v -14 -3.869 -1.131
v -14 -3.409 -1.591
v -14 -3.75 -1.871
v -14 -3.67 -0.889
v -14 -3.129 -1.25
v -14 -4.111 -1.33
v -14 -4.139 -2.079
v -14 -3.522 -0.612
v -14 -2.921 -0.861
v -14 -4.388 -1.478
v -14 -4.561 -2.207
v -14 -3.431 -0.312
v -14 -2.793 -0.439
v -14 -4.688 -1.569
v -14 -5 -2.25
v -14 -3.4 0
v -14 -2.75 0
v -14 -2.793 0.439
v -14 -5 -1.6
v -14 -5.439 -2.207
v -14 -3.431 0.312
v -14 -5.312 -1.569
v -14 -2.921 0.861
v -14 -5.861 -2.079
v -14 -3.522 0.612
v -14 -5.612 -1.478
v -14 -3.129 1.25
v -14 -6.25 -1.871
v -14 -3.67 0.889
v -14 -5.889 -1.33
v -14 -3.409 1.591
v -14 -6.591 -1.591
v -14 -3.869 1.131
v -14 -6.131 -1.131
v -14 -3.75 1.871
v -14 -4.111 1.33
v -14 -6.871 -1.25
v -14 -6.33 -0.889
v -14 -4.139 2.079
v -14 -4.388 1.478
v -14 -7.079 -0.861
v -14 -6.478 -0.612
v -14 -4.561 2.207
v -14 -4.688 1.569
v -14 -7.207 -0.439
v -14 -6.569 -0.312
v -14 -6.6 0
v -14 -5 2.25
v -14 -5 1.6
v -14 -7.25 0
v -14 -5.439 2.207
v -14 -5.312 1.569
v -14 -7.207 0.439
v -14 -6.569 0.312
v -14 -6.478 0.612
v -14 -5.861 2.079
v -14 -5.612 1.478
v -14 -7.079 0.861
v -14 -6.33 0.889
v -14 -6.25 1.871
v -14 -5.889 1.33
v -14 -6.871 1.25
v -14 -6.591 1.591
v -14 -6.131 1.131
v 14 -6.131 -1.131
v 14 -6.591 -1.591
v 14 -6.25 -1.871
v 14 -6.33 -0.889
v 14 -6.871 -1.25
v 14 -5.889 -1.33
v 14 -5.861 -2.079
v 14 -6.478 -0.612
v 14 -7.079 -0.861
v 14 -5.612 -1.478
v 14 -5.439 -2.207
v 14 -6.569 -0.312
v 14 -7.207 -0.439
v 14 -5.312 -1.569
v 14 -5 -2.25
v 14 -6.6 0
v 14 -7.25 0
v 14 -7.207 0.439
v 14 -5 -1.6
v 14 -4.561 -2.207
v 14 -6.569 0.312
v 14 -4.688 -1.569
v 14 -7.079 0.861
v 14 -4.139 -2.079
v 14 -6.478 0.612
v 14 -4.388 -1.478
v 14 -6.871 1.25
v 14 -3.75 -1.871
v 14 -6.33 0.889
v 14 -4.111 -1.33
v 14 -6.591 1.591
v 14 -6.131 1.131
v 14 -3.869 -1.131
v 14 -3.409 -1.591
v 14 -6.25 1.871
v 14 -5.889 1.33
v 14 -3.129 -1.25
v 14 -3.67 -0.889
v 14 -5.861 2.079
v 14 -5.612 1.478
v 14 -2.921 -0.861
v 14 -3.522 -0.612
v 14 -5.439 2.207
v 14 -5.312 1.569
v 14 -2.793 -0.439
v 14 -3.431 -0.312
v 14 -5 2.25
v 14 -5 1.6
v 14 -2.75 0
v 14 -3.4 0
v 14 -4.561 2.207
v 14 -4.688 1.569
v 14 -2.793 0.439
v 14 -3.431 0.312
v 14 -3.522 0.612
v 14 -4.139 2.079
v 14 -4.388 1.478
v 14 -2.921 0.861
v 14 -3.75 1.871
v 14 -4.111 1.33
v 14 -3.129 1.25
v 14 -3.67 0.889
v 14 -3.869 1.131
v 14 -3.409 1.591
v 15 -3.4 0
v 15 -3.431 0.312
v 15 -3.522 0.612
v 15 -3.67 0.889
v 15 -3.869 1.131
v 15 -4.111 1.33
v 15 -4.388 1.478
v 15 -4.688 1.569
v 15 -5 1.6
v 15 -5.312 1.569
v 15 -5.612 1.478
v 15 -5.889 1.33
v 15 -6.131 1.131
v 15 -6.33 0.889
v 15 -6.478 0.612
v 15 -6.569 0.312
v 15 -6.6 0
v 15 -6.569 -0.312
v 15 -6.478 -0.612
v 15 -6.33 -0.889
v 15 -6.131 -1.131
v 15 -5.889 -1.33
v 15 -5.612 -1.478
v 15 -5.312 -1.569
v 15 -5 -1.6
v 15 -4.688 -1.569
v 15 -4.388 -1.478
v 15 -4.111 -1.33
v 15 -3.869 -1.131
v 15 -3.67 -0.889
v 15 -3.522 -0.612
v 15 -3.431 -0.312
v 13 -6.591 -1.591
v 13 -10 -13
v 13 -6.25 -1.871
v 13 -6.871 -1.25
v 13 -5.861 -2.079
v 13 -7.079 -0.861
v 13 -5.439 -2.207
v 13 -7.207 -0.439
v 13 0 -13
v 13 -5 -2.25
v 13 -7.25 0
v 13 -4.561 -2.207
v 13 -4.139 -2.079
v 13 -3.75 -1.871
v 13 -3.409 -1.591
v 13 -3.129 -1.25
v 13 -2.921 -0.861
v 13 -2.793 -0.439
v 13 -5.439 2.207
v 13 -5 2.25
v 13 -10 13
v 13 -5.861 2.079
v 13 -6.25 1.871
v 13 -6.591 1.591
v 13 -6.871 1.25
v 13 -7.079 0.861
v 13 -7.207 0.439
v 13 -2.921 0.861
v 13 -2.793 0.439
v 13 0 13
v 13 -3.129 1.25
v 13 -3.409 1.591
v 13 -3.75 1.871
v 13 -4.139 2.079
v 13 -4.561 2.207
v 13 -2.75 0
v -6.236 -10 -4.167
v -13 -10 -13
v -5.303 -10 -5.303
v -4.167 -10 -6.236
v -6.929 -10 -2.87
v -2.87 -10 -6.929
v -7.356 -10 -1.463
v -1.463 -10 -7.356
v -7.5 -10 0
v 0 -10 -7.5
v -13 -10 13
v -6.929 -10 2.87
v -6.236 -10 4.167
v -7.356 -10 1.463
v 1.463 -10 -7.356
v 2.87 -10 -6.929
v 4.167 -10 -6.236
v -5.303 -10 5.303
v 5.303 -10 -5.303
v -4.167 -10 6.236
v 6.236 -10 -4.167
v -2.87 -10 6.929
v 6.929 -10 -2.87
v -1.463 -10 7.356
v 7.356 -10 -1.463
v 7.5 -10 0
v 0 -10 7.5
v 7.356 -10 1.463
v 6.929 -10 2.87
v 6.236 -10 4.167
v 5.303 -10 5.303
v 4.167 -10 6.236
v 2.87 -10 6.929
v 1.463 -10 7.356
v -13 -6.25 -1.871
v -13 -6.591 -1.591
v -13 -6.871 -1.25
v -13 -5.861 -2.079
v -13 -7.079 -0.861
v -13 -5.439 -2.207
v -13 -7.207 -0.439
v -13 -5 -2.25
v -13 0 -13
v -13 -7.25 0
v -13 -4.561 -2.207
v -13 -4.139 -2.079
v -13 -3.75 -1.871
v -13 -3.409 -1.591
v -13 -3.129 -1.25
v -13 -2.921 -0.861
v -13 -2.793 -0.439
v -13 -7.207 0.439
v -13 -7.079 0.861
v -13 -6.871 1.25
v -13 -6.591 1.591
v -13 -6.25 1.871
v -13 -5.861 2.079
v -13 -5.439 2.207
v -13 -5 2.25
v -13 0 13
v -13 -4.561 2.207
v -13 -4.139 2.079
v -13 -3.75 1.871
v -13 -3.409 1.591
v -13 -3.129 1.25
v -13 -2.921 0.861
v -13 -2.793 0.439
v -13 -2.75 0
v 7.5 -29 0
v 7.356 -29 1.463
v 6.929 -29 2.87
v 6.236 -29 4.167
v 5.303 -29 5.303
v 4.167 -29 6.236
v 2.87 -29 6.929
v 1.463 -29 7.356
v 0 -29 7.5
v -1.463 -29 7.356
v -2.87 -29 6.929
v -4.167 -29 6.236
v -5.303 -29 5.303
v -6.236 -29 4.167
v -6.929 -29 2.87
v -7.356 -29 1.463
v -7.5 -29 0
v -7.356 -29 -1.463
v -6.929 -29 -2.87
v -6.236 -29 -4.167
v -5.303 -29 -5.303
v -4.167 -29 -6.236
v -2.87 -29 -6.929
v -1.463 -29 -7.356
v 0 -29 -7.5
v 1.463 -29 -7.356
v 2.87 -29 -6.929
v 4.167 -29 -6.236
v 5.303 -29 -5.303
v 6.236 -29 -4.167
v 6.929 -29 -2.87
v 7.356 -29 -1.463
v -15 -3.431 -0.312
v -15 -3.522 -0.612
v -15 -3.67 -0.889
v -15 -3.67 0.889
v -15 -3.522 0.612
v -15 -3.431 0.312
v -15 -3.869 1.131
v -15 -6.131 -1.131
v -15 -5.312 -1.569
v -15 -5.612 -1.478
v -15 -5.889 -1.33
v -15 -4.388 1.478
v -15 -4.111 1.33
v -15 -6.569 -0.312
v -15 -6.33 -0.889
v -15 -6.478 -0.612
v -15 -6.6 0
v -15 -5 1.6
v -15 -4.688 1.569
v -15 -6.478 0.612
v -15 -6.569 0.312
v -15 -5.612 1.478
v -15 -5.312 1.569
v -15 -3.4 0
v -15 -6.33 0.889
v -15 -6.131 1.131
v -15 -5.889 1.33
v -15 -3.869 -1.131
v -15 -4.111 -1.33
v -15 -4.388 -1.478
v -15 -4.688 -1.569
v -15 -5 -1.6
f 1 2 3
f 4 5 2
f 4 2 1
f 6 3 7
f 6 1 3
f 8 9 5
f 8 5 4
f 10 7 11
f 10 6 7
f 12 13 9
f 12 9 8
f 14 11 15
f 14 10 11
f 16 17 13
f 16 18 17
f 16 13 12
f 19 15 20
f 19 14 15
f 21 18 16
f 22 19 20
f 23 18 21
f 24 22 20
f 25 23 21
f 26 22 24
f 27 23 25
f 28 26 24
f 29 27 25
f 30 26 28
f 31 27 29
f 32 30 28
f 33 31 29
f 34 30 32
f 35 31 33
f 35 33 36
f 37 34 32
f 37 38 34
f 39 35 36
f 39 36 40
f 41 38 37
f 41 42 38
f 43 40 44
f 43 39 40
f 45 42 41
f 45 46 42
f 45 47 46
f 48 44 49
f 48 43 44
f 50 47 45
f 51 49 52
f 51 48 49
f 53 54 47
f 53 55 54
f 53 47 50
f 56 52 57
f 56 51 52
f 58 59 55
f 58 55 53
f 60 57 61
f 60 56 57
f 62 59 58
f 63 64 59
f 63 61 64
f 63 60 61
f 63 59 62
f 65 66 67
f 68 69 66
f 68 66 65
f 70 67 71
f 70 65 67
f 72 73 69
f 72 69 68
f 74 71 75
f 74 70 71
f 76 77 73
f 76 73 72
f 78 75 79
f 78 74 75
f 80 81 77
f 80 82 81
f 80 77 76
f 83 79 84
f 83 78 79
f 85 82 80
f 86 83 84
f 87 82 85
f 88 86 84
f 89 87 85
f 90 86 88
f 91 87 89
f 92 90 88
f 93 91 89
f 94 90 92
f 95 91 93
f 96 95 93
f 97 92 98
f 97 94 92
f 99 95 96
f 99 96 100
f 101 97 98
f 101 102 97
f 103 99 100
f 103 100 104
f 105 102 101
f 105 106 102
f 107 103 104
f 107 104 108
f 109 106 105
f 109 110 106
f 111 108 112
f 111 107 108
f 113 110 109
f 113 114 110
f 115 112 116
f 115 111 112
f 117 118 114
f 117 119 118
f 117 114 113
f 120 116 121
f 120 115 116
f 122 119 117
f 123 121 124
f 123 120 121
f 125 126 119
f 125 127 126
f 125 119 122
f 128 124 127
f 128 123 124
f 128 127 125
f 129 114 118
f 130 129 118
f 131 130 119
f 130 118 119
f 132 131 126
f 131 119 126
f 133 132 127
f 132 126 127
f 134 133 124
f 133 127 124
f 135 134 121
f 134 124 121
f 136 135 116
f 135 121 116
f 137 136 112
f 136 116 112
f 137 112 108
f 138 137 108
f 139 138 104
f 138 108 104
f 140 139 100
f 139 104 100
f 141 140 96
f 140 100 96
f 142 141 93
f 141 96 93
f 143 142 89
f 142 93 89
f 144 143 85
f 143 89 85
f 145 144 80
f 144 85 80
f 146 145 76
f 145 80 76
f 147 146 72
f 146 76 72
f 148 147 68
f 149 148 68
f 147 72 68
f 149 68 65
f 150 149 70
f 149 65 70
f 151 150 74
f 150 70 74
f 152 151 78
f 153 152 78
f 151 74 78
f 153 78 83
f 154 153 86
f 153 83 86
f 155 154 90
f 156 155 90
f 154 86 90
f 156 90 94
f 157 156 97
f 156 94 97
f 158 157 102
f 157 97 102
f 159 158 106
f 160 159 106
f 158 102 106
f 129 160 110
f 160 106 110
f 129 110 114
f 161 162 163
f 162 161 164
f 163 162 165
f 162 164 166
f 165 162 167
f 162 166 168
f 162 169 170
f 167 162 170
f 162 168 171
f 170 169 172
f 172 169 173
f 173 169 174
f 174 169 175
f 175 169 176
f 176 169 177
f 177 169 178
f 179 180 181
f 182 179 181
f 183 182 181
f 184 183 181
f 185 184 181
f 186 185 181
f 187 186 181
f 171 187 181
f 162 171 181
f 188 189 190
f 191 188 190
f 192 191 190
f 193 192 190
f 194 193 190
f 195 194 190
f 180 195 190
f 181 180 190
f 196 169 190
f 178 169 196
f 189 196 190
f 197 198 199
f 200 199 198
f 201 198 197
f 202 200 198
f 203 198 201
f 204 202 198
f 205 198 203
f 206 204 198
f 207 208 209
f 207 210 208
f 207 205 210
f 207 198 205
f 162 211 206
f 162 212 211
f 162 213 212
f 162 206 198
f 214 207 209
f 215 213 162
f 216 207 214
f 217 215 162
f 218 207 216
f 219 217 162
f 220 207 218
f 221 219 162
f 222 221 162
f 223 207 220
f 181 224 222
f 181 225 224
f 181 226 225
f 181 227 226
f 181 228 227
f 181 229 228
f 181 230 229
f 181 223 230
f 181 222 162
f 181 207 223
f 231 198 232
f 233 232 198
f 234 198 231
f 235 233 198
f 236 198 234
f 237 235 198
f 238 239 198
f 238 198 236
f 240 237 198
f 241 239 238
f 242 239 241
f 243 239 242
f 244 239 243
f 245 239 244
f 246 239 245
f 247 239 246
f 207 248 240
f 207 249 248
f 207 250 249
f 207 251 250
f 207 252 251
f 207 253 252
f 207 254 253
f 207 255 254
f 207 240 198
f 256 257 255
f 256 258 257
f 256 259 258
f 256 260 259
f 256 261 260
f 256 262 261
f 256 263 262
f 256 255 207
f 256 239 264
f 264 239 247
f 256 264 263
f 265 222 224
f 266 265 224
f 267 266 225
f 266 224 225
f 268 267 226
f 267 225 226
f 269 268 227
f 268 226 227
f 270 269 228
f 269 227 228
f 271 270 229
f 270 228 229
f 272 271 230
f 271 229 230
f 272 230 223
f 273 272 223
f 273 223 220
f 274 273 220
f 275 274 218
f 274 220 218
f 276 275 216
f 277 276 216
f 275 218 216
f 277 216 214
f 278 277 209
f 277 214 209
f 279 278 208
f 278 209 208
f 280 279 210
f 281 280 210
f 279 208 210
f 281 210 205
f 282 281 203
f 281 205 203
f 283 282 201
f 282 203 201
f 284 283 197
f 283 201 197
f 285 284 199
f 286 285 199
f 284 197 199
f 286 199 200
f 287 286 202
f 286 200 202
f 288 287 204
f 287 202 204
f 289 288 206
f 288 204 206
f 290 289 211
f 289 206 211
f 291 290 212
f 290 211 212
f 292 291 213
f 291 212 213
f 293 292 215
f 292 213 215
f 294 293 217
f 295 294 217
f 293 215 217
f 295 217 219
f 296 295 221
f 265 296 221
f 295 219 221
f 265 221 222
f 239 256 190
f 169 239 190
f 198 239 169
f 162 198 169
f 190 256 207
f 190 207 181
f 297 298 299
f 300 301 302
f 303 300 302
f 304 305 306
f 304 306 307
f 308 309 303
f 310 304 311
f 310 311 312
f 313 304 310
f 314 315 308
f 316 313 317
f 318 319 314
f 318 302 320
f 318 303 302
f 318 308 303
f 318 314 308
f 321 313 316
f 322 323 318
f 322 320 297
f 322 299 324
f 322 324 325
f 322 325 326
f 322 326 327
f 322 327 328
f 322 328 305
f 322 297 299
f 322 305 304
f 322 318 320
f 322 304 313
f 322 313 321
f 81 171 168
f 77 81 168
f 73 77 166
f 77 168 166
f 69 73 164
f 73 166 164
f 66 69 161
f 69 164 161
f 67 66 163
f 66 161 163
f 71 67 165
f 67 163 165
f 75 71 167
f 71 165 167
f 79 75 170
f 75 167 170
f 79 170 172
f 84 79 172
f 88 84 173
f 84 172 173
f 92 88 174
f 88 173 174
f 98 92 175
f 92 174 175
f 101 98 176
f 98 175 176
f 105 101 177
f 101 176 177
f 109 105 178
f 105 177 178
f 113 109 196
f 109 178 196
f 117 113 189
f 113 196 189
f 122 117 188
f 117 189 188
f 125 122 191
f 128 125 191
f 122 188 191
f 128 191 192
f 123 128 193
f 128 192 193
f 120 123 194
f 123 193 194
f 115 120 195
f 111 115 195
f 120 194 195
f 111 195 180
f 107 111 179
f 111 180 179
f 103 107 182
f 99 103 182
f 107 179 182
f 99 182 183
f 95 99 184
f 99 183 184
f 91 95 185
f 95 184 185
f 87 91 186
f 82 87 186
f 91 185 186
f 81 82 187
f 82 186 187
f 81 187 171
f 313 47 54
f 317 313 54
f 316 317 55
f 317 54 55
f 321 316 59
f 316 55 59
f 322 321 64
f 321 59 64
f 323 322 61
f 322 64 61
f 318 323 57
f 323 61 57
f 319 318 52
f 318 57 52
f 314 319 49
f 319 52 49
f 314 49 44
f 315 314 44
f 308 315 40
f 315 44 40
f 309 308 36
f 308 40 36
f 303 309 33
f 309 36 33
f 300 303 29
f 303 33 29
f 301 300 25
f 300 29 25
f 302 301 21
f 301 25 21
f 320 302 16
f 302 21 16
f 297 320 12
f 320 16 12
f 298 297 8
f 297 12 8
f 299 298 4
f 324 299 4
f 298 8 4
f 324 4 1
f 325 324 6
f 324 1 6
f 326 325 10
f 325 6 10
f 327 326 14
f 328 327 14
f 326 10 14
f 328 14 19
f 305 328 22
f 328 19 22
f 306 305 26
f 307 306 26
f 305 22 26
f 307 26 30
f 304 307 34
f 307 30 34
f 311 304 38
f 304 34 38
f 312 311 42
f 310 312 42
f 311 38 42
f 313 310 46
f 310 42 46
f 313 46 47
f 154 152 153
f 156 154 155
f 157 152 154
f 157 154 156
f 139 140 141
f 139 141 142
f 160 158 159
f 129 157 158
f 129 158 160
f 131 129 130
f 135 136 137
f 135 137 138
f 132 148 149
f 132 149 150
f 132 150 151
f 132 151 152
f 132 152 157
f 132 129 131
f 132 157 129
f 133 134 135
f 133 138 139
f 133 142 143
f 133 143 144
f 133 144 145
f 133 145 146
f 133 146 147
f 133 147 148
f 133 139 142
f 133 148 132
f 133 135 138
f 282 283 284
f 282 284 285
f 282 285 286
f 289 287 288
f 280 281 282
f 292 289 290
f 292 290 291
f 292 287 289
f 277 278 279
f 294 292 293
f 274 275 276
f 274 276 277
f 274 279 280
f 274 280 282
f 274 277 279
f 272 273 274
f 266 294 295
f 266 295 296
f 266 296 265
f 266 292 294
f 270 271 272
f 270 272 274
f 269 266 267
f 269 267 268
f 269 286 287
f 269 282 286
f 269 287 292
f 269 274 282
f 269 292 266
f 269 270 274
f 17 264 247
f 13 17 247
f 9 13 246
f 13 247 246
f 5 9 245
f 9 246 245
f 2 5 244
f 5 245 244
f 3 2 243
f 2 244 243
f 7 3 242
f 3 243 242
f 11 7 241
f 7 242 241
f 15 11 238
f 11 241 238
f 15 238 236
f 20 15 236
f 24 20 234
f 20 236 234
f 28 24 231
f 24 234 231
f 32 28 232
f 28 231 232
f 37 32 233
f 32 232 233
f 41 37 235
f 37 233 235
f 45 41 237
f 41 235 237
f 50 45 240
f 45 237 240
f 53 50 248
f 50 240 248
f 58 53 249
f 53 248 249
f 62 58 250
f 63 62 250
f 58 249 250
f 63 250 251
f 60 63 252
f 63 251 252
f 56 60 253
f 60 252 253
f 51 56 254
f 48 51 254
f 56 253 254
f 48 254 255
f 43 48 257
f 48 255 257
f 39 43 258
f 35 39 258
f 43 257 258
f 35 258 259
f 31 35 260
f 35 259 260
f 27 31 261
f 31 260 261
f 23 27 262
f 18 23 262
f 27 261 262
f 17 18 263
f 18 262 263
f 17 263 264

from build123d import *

# Parameters (mm, degrees)
F0_W      = 26
F0_H      = 26
F1_DEPTH  = 10
F2_R      = 7.5
F3_DEPTH  = 19
F5_DEPTH  = 1
F7_DEPTH  = 1
F8_R      = 1.6
F9_DEPTH  = 1
F10_R     = 1.6
F11_DEPTH = 1


with BuildPart() as f1:
    # F0 (on Front) → F1 (new body)
    with BuildSketch(Plane.XZ):
        Rectangle(F0_W, F0_H)
    extrude(amount=F1_DEPTH)

    # F2 (on face) → F3 (join)
    with BuildSketch(Plane.XZ.offset(10)):
        Circle(F2_R)
    extrude(amount=F3_DEPTH)

    # F4 (on face) → F5 (join)
    with BuildSketch(Plane.YZ.offset(13)):
        with BuildLine():
            ThreePointArc((-2.75, 0), (-5, 2.25), (-7.25, 0))
            Line((-7.25, 0), (-2.75, 0))
        make_face()
        with BuildLine():
            Line((-2.75, 0), (-7.25, 0))
            ThreePointArc((-7.25, 0), (-5, -2.25), (-2.75, 0))
        make_face()
    extrude(amount=F5_DEPTH)

    # F6 (on face) → F7 (join)
    with BuildSketch(Plane(origin=(-13, 0, 0), x_dir=(0, -1, 0), z_dir=(-1, 0, 0))):
        with BuildLine():
            ThreePointArc((7.25, 0), (5, 2.25), (2.75, 0))
            Line((2.75, 0), (7.25, 0))
        make_face()
        with BuildLine():
            Line((7.25, 0), (2.75, 0))
            ThreePointArc((2.75, 0), (5, -2.25), (7.25, 0))
        make_face()
    extrude(amount=F7_DEPTH)

    # F8 (on face) → F9 (join)
    with BuildSketch(Plane(origin=(-14, 0, 0), x_dir=(0, -1, 0), z_dir=(-1, 0, 0))):
        with Locations((5, 0)):
            Circle(F8_R)
    extrude(amount=F9_DEPTH)

    # F10 (on face) → F11 (join)
    with BuildSketch(Plane.YZ.offset(14)):
        with Locations((-5, 0)):
            Circle(F10_R)
    extrude(amount=F11_DEPTH)


solid = f1.part
